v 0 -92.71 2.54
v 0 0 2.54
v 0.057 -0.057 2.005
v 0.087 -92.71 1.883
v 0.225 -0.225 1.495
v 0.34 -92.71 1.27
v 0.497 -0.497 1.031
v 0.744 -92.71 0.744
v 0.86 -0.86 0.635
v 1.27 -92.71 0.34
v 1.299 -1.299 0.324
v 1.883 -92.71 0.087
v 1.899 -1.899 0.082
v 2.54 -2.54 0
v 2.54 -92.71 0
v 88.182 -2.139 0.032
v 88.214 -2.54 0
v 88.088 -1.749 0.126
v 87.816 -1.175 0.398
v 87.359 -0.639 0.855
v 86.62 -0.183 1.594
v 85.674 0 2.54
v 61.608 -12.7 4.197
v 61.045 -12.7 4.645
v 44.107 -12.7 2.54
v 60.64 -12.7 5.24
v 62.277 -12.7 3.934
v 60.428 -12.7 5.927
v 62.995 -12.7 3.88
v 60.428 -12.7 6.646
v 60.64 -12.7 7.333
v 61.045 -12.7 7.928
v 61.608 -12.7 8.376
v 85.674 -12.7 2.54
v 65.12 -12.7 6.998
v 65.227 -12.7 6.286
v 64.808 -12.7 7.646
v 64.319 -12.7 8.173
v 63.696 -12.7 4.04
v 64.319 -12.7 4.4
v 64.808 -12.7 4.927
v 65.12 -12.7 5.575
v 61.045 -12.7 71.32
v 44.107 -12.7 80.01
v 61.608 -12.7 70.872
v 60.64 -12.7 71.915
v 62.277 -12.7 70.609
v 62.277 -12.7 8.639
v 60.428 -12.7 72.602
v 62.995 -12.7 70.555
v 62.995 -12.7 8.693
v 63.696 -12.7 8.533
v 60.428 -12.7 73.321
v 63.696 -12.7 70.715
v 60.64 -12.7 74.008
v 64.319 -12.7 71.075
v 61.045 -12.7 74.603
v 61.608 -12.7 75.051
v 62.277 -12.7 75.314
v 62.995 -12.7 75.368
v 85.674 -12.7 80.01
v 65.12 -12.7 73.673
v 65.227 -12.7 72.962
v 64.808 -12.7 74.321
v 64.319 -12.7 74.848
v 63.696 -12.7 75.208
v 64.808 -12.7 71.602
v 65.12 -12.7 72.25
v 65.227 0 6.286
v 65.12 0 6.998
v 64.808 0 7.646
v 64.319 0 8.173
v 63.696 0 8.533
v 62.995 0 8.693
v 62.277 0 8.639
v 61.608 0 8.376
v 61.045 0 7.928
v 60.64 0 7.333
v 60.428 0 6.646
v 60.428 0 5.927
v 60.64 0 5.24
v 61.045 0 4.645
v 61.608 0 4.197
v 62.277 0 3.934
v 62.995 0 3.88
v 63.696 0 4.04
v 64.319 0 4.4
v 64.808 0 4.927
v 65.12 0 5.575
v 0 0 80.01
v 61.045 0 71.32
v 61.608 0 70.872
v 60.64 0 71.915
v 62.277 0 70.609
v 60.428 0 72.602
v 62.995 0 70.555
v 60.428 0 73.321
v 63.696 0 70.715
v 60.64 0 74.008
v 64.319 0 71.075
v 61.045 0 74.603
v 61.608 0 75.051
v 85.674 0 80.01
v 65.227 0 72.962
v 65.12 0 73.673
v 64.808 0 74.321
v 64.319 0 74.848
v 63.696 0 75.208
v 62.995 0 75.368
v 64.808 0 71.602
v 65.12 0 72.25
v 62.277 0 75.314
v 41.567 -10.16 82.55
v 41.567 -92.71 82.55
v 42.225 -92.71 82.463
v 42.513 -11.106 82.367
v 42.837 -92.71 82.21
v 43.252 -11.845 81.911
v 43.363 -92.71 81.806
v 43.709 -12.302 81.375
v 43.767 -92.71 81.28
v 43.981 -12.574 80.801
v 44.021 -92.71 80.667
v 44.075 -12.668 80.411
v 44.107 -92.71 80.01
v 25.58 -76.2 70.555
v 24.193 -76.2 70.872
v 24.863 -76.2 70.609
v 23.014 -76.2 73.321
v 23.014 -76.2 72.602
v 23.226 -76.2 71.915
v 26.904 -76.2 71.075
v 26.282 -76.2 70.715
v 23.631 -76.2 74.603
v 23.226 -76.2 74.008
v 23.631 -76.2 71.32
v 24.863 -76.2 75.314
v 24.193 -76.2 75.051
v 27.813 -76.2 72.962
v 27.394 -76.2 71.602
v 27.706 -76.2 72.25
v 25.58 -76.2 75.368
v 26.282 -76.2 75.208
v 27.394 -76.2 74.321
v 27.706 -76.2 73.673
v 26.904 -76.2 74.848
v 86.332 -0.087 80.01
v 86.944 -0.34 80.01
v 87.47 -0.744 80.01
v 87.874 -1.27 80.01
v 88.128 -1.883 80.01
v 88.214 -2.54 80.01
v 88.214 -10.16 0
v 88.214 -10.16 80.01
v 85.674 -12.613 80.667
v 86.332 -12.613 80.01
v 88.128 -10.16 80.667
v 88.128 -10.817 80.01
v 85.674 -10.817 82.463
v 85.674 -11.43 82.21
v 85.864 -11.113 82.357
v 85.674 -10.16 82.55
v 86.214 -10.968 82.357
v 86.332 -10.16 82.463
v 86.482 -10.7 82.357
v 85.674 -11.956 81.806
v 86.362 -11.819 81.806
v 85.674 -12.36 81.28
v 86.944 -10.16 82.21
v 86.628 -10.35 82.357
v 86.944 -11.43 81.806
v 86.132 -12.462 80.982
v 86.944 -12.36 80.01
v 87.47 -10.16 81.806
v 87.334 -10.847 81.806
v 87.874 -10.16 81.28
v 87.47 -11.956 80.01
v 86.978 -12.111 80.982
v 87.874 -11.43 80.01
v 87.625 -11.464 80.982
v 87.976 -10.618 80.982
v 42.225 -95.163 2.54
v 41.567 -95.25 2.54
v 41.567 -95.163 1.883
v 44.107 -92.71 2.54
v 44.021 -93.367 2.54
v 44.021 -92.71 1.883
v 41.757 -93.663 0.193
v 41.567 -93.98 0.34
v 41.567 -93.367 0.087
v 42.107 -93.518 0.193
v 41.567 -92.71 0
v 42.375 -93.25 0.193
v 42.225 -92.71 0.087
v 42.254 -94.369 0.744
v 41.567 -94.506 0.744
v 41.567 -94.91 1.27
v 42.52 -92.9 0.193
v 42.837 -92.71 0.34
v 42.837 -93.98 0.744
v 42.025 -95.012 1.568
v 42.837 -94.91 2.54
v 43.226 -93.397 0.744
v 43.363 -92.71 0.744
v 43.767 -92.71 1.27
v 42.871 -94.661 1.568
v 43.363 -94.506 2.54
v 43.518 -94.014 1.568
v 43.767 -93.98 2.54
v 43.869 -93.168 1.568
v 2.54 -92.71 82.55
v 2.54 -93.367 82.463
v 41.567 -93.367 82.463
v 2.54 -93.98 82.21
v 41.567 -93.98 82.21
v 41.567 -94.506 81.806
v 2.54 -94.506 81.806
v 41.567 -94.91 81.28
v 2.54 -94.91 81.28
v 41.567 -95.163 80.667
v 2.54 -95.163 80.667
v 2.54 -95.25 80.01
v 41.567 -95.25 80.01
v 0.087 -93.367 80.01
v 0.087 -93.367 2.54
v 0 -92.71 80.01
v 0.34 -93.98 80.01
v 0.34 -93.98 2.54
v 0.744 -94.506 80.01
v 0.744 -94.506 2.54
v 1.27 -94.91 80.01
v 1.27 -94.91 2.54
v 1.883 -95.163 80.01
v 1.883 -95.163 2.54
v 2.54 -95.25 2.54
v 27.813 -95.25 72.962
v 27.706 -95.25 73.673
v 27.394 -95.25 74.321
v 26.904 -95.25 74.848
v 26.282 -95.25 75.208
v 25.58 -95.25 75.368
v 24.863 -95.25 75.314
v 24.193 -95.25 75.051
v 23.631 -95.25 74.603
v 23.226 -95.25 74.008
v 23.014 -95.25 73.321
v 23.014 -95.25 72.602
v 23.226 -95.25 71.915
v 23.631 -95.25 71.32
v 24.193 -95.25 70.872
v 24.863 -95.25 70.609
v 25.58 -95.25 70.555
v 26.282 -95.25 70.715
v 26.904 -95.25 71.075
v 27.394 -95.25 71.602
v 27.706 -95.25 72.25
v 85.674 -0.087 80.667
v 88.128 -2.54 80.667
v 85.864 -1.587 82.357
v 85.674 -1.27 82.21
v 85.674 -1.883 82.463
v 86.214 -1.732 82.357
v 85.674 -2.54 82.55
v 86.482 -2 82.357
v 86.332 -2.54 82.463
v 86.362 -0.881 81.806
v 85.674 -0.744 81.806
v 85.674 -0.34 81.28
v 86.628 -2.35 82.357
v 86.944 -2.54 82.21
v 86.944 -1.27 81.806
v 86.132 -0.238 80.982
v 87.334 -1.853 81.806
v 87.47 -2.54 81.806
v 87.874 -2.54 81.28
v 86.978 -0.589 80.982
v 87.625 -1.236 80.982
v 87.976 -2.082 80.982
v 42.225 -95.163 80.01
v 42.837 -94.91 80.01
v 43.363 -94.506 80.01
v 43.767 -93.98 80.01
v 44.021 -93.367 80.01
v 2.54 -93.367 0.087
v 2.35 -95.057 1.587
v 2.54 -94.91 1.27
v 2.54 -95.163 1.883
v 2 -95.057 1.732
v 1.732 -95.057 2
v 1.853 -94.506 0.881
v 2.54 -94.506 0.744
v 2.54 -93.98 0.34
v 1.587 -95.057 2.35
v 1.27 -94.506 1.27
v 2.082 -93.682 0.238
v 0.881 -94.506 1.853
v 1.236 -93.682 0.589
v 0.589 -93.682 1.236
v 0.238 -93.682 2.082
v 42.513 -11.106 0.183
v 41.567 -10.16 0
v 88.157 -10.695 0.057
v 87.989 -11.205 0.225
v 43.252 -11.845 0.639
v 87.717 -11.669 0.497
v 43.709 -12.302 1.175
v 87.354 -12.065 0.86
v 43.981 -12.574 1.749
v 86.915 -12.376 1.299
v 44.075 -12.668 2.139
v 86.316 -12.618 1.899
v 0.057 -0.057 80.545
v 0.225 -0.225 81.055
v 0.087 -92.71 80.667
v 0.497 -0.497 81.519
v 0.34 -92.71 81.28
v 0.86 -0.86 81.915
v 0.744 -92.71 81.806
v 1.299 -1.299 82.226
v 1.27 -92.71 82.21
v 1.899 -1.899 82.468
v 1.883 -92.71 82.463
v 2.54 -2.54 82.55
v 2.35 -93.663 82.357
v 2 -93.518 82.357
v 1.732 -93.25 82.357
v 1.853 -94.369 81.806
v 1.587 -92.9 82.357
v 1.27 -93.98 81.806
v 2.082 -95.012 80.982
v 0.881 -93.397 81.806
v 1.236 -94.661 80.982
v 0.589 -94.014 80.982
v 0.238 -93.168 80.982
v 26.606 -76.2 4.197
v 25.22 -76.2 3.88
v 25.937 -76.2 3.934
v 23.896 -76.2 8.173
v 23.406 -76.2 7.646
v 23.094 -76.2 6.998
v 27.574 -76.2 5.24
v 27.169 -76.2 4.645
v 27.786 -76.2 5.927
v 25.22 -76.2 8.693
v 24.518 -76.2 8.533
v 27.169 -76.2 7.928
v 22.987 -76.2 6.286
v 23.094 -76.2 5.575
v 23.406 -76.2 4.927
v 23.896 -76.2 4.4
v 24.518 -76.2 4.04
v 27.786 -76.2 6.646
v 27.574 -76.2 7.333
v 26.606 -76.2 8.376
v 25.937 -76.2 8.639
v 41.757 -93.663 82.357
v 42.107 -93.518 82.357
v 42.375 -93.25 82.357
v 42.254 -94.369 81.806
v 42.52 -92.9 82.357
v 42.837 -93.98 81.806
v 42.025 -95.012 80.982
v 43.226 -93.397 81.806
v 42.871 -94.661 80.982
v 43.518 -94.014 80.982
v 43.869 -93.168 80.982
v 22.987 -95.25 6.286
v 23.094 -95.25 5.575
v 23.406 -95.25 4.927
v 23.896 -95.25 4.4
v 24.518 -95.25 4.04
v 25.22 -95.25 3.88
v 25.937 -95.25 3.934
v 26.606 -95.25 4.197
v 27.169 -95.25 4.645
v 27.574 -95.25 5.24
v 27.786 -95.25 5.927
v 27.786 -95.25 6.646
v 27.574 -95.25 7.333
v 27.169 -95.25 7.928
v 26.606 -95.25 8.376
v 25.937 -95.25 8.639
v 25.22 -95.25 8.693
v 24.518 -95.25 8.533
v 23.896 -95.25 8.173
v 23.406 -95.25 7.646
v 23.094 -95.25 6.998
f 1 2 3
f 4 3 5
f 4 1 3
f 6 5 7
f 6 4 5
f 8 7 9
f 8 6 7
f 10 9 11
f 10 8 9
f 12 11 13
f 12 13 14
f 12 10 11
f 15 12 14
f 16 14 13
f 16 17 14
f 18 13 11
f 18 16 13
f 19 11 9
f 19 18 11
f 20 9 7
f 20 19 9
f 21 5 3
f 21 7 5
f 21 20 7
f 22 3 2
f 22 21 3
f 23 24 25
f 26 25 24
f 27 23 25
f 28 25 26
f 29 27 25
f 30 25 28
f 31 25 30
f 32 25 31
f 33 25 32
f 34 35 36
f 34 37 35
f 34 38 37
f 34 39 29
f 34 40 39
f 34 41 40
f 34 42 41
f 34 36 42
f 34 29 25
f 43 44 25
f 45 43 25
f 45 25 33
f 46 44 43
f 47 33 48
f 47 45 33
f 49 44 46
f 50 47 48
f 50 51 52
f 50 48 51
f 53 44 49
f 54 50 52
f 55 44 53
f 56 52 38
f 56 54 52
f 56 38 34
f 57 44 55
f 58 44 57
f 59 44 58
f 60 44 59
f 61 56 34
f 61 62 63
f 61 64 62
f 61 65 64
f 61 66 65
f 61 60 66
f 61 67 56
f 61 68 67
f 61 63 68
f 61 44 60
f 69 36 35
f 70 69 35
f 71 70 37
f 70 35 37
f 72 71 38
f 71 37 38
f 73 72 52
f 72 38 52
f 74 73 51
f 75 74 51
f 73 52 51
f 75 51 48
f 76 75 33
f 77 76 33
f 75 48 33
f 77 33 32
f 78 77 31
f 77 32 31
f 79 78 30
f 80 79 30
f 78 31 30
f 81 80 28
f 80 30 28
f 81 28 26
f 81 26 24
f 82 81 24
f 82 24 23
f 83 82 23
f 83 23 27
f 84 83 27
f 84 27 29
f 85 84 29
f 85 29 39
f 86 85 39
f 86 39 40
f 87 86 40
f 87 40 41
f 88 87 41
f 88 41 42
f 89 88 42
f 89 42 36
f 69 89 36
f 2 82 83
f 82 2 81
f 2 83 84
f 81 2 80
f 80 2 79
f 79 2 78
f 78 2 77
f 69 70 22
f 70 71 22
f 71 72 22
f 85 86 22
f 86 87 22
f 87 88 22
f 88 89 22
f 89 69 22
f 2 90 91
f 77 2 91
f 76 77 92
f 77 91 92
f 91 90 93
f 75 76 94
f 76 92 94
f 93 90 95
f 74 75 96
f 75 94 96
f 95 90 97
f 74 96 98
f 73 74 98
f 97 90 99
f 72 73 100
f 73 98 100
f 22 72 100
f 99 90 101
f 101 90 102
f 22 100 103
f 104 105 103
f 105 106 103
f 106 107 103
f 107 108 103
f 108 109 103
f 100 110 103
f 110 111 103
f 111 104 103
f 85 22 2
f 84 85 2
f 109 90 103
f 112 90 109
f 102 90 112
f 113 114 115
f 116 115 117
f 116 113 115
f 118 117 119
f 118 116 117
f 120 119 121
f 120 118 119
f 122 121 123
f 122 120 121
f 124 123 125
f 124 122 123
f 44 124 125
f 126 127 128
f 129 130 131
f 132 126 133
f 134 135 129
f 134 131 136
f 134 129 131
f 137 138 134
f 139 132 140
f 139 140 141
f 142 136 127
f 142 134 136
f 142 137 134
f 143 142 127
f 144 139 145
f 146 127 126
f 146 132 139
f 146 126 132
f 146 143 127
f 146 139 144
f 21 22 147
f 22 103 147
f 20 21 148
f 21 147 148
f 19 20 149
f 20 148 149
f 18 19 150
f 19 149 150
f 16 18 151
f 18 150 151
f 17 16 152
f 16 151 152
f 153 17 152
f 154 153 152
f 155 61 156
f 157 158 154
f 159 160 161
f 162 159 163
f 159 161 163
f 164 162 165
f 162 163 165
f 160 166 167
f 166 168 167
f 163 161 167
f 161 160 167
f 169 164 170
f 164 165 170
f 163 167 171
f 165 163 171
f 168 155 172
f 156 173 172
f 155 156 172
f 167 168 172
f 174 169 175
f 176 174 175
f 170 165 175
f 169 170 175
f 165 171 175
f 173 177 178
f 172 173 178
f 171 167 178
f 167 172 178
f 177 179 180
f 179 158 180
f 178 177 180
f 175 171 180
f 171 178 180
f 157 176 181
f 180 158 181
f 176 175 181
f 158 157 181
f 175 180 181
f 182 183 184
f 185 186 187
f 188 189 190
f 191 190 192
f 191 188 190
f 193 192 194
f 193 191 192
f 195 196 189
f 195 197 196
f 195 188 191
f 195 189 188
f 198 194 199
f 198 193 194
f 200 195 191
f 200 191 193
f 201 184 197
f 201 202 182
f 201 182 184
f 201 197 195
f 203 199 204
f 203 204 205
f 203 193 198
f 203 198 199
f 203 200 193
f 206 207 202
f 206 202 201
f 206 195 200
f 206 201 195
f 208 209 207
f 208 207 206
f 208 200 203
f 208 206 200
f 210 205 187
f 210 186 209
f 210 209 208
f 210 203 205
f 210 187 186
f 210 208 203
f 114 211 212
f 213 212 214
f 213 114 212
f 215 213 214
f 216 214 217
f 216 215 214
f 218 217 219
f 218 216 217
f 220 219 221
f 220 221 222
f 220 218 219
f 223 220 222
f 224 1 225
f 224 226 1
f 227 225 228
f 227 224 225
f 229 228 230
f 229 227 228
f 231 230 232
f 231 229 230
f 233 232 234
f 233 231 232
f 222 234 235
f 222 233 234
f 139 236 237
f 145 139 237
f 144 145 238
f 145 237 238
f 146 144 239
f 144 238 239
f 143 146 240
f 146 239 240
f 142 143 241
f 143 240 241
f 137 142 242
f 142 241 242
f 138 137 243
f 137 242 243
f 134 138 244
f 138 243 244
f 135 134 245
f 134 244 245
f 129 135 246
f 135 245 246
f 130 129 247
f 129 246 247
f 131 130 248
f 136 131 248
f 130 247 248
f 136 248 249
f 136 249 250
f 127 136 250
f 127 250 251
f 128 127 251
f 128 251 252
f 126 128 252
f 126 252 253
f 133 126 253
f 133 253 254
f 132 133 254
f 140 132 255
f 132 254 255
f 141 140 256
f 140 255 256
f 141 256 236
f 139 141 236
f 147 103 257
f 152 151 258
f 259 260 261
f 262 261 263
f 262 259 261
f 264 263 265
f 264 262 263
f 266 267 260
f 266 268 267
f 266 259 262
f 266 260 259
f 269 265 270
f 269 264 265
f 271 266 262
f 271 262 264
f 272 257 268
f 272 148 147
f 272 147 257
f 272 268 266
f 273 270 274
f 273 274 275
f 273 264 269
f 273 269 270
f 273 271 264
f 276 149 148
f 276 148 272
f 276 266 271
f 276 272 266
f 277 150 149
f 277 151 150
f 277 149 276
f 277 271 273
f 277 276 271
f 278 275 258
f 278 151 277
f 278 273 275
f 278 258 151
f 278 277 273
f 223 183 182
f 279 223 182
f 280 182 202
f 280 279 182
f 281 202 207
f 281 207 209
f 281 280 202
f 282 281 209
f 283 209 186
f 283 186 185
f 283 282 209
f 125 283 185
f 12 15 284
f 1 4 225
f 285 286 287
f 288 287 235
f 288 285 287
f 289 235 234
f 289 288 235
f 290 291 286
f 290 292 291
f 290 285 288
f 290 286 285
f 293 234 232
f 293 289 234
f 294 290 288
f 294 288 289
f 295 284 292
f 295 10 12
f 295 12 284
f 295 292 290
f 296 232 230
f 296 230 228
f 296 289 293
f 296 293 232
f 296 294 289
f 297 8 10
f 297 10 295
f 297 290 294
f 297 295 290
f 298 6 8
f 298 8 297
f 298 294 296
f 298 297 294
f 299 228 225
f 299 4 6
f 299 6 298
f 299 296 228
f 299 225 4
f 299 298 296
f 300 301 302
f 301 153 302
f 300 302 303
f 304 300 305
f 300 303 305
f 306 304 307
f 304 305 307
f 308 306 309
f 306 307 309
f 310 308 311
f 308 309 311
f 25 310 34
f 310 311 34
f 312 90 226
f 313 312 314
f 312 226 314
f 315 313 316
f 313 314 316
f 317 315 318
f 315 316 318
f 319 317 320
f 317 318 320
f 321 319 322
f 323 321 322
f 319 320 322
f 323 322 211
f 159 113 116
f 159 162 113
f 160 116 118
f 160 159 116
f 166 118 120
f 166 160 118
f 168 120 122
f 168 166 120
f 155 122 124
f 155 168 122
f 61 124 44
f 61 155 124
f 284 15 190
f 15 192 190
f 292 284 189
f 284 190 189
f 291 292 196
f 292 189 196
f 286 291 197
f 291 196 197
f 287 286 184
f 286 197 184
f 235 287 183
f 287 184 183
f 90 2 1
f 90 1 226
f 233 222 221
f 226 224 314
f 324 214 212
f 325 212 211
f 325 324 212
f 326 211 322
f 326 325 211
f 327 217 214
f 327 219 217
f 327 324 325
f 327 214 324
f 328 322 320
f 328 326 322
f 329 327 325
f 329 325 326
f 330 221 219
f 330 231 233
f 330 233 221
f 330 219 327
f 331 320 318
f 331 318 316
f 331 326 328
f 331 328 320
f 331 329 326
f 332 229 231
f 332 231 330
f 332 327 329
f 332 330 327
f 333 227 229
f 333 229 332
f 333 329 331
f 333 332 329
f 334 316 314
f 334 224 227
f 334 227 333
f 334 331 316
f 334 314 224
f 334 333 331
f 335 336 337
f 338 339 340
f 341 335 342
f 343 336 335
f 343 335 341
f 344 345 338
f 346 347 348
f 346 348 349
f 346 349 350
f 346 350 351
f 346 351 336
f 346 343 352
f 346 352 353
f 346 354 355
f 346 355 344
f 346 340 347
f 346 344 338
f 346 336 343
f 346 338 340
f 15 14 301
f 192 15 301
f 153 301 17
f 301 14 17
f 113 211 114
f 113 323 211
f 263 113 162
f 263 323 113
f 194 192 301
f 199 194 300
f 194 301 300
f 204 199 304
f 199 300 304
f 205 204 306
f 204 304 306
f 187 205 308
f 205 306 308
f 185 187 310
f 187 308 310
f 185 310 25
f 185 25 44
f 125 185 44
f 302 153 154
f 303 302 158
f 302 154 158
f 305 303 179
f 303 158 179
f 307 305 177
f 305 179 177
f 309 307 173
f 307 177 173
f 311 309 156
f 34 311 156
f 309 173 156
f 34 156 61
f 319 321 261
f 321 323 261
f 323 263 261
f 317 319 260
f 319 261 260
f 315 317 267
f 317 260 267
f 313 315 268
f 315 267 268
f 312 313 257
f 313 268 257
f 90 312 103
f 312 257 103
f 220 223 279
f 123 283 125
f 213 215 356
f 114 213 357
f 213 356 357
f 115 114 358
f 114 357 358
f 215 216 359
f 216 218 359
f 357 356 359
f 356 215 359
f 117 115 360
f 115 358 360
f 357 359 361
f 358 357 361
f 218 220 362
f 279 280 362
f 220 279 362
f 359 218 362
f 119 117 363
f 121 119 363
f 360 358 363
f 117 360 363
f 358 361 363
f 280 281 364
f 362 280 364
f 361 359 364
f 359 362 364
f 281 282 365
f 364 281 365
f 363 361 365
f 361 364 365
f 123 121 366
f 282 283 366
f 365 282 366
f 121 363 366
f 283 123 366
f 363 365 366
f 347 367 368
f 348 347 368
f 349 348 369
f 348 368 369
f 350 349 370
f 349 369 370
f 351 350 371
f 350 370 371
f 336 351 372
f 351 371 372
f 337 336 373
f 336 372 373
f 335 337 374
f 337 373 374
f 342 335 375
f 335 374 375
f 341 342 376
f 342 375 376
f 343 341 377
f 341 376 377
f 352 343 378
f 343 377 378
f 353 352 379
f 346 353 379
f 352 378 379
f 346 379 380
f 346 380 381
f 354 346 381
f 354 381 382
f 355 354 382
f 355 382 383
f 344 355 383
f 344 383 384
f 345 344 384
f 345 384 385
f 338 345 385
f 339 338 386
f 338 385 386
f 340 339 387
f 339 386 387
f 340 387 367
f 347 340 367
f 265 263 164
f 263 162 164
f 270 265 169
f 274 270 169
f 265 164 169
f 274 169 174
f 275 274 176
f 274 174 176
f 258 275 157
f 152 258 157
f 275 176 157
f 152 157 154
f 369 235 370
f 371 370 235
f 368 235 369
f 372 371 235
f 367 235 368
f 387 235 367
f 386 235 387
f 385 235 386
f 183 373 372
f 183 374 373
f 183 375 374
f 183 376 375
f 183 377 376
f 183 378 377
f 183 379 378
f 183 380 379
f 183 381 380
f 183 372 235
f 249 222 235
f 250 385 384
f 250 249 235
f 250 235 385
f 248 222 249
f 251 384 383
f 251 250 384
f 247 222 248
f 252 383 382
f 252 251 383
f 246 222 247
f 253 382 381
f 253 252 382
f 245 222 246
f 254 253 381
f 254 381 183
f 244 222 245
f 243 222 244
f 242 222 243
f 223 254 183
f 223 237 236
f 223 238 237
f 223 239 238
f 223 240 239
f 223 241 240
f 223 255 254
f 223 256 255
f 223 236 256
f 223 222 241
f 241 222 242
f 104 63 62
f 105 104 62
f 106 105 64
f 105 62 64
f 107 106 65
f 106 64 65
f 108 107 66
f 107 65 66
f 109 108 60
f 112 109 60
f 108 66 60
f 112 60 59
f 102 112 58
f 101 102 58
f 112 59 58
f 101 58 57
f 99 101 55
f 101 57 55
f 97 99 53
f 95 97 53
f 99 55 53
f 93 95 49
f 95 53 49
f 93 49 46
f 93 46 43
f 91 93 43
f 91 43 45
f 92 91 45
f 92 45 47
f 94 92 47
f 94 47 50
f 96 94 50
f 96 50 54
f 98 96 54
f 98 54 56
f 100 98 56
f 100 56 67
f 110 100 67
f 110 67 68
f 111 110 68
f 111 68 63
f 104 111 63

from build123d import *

# Parameters (mm, degrees)
F0_W     = 88.2142
F0_H     = 82.55
F1_DEPTH = 95.25
F2_W     = 44.1071
F2_H     = 82.55
F3_DEPTH = 82.55
F4_R     = 2.54
F5_R     = 2.413
F6_DEPTH = 19.05
F7_DEPTH = 127


with BuildPart() as f1:
    # F0 (on Front) → F1 (new body)
    with BuildSketch(Plane.XZ):
        with Locations((44.1071, 41.275)):
            Rectangle(F0_W, F0_H)
    extrude(amount=F1_DEPTH)

    # F2 (on face) → F3 (cut)
    with BuildSketch(Plane.XZ.offset(95.25)):
        with Locations((66.16065, 41.275)):
            Rectangle(F2_W, F2_H)
    extrude(amount=-F3_DEPTH, mode=Mode.SUBTRACT)

    # F4
    f4_edges = [f1.edges().sort_by_distance(p)[0] for p in [
        (44.1071, -95.25, 41.275),
        (88.2142, 0, 41.275),
        (88.2142, -12.7, 41.275),
        (0, -47.625, 0),
        (22.05355, -95.25, 0),
        (0, -95.25, 41.275),
        (22.05355, -95.25, 82.55),
        (0, -47.625, 82.55),
        (44.1071, 0, 82.55),
        (44.1071, -53.975, 82.55),
        (66.16065, -12.7, 82.55),
        (88.2142, -6.35, 82.55),
        (44.1071, -53.975, 0),
        (66.16065, -12.7, 0),
        (44.1071, 0, 0),
    ]]
    fillet(f4_edges, radius=F4_R)

    # F5 (on face) → F6 (cut)
    with BuildSketch(Plane.XZ.offset(95.25)):
        with BuildLine():
            ThreePointArc((27.813, 6.2865), (25.4, 8.6995), (22.987, 6.2865))
            ThreePointArc((22.987, 6.2865), (25.4, 3.8735), (27.813, 6.2865))
        make_face()
        with Locations((25.4, 72.9615)):
            Circle(F5_R)
    extrude(amount=-F6_DEPTH, mode=Mode.SUBTRACT)

    # F5 (on face) → F7 (cut)
    with BuildSketch(Plane.XZ.offset(95.25)):
        with Locations((62.8142, 6.2865)):
            Circle(F5_R)
        with Locations((62.8142, 72.9615)):
            Circle(F5_R)
    extrude(amount=-F7_DEPTH, mode=Mode.SUBTRACT)


solid = f1.part
